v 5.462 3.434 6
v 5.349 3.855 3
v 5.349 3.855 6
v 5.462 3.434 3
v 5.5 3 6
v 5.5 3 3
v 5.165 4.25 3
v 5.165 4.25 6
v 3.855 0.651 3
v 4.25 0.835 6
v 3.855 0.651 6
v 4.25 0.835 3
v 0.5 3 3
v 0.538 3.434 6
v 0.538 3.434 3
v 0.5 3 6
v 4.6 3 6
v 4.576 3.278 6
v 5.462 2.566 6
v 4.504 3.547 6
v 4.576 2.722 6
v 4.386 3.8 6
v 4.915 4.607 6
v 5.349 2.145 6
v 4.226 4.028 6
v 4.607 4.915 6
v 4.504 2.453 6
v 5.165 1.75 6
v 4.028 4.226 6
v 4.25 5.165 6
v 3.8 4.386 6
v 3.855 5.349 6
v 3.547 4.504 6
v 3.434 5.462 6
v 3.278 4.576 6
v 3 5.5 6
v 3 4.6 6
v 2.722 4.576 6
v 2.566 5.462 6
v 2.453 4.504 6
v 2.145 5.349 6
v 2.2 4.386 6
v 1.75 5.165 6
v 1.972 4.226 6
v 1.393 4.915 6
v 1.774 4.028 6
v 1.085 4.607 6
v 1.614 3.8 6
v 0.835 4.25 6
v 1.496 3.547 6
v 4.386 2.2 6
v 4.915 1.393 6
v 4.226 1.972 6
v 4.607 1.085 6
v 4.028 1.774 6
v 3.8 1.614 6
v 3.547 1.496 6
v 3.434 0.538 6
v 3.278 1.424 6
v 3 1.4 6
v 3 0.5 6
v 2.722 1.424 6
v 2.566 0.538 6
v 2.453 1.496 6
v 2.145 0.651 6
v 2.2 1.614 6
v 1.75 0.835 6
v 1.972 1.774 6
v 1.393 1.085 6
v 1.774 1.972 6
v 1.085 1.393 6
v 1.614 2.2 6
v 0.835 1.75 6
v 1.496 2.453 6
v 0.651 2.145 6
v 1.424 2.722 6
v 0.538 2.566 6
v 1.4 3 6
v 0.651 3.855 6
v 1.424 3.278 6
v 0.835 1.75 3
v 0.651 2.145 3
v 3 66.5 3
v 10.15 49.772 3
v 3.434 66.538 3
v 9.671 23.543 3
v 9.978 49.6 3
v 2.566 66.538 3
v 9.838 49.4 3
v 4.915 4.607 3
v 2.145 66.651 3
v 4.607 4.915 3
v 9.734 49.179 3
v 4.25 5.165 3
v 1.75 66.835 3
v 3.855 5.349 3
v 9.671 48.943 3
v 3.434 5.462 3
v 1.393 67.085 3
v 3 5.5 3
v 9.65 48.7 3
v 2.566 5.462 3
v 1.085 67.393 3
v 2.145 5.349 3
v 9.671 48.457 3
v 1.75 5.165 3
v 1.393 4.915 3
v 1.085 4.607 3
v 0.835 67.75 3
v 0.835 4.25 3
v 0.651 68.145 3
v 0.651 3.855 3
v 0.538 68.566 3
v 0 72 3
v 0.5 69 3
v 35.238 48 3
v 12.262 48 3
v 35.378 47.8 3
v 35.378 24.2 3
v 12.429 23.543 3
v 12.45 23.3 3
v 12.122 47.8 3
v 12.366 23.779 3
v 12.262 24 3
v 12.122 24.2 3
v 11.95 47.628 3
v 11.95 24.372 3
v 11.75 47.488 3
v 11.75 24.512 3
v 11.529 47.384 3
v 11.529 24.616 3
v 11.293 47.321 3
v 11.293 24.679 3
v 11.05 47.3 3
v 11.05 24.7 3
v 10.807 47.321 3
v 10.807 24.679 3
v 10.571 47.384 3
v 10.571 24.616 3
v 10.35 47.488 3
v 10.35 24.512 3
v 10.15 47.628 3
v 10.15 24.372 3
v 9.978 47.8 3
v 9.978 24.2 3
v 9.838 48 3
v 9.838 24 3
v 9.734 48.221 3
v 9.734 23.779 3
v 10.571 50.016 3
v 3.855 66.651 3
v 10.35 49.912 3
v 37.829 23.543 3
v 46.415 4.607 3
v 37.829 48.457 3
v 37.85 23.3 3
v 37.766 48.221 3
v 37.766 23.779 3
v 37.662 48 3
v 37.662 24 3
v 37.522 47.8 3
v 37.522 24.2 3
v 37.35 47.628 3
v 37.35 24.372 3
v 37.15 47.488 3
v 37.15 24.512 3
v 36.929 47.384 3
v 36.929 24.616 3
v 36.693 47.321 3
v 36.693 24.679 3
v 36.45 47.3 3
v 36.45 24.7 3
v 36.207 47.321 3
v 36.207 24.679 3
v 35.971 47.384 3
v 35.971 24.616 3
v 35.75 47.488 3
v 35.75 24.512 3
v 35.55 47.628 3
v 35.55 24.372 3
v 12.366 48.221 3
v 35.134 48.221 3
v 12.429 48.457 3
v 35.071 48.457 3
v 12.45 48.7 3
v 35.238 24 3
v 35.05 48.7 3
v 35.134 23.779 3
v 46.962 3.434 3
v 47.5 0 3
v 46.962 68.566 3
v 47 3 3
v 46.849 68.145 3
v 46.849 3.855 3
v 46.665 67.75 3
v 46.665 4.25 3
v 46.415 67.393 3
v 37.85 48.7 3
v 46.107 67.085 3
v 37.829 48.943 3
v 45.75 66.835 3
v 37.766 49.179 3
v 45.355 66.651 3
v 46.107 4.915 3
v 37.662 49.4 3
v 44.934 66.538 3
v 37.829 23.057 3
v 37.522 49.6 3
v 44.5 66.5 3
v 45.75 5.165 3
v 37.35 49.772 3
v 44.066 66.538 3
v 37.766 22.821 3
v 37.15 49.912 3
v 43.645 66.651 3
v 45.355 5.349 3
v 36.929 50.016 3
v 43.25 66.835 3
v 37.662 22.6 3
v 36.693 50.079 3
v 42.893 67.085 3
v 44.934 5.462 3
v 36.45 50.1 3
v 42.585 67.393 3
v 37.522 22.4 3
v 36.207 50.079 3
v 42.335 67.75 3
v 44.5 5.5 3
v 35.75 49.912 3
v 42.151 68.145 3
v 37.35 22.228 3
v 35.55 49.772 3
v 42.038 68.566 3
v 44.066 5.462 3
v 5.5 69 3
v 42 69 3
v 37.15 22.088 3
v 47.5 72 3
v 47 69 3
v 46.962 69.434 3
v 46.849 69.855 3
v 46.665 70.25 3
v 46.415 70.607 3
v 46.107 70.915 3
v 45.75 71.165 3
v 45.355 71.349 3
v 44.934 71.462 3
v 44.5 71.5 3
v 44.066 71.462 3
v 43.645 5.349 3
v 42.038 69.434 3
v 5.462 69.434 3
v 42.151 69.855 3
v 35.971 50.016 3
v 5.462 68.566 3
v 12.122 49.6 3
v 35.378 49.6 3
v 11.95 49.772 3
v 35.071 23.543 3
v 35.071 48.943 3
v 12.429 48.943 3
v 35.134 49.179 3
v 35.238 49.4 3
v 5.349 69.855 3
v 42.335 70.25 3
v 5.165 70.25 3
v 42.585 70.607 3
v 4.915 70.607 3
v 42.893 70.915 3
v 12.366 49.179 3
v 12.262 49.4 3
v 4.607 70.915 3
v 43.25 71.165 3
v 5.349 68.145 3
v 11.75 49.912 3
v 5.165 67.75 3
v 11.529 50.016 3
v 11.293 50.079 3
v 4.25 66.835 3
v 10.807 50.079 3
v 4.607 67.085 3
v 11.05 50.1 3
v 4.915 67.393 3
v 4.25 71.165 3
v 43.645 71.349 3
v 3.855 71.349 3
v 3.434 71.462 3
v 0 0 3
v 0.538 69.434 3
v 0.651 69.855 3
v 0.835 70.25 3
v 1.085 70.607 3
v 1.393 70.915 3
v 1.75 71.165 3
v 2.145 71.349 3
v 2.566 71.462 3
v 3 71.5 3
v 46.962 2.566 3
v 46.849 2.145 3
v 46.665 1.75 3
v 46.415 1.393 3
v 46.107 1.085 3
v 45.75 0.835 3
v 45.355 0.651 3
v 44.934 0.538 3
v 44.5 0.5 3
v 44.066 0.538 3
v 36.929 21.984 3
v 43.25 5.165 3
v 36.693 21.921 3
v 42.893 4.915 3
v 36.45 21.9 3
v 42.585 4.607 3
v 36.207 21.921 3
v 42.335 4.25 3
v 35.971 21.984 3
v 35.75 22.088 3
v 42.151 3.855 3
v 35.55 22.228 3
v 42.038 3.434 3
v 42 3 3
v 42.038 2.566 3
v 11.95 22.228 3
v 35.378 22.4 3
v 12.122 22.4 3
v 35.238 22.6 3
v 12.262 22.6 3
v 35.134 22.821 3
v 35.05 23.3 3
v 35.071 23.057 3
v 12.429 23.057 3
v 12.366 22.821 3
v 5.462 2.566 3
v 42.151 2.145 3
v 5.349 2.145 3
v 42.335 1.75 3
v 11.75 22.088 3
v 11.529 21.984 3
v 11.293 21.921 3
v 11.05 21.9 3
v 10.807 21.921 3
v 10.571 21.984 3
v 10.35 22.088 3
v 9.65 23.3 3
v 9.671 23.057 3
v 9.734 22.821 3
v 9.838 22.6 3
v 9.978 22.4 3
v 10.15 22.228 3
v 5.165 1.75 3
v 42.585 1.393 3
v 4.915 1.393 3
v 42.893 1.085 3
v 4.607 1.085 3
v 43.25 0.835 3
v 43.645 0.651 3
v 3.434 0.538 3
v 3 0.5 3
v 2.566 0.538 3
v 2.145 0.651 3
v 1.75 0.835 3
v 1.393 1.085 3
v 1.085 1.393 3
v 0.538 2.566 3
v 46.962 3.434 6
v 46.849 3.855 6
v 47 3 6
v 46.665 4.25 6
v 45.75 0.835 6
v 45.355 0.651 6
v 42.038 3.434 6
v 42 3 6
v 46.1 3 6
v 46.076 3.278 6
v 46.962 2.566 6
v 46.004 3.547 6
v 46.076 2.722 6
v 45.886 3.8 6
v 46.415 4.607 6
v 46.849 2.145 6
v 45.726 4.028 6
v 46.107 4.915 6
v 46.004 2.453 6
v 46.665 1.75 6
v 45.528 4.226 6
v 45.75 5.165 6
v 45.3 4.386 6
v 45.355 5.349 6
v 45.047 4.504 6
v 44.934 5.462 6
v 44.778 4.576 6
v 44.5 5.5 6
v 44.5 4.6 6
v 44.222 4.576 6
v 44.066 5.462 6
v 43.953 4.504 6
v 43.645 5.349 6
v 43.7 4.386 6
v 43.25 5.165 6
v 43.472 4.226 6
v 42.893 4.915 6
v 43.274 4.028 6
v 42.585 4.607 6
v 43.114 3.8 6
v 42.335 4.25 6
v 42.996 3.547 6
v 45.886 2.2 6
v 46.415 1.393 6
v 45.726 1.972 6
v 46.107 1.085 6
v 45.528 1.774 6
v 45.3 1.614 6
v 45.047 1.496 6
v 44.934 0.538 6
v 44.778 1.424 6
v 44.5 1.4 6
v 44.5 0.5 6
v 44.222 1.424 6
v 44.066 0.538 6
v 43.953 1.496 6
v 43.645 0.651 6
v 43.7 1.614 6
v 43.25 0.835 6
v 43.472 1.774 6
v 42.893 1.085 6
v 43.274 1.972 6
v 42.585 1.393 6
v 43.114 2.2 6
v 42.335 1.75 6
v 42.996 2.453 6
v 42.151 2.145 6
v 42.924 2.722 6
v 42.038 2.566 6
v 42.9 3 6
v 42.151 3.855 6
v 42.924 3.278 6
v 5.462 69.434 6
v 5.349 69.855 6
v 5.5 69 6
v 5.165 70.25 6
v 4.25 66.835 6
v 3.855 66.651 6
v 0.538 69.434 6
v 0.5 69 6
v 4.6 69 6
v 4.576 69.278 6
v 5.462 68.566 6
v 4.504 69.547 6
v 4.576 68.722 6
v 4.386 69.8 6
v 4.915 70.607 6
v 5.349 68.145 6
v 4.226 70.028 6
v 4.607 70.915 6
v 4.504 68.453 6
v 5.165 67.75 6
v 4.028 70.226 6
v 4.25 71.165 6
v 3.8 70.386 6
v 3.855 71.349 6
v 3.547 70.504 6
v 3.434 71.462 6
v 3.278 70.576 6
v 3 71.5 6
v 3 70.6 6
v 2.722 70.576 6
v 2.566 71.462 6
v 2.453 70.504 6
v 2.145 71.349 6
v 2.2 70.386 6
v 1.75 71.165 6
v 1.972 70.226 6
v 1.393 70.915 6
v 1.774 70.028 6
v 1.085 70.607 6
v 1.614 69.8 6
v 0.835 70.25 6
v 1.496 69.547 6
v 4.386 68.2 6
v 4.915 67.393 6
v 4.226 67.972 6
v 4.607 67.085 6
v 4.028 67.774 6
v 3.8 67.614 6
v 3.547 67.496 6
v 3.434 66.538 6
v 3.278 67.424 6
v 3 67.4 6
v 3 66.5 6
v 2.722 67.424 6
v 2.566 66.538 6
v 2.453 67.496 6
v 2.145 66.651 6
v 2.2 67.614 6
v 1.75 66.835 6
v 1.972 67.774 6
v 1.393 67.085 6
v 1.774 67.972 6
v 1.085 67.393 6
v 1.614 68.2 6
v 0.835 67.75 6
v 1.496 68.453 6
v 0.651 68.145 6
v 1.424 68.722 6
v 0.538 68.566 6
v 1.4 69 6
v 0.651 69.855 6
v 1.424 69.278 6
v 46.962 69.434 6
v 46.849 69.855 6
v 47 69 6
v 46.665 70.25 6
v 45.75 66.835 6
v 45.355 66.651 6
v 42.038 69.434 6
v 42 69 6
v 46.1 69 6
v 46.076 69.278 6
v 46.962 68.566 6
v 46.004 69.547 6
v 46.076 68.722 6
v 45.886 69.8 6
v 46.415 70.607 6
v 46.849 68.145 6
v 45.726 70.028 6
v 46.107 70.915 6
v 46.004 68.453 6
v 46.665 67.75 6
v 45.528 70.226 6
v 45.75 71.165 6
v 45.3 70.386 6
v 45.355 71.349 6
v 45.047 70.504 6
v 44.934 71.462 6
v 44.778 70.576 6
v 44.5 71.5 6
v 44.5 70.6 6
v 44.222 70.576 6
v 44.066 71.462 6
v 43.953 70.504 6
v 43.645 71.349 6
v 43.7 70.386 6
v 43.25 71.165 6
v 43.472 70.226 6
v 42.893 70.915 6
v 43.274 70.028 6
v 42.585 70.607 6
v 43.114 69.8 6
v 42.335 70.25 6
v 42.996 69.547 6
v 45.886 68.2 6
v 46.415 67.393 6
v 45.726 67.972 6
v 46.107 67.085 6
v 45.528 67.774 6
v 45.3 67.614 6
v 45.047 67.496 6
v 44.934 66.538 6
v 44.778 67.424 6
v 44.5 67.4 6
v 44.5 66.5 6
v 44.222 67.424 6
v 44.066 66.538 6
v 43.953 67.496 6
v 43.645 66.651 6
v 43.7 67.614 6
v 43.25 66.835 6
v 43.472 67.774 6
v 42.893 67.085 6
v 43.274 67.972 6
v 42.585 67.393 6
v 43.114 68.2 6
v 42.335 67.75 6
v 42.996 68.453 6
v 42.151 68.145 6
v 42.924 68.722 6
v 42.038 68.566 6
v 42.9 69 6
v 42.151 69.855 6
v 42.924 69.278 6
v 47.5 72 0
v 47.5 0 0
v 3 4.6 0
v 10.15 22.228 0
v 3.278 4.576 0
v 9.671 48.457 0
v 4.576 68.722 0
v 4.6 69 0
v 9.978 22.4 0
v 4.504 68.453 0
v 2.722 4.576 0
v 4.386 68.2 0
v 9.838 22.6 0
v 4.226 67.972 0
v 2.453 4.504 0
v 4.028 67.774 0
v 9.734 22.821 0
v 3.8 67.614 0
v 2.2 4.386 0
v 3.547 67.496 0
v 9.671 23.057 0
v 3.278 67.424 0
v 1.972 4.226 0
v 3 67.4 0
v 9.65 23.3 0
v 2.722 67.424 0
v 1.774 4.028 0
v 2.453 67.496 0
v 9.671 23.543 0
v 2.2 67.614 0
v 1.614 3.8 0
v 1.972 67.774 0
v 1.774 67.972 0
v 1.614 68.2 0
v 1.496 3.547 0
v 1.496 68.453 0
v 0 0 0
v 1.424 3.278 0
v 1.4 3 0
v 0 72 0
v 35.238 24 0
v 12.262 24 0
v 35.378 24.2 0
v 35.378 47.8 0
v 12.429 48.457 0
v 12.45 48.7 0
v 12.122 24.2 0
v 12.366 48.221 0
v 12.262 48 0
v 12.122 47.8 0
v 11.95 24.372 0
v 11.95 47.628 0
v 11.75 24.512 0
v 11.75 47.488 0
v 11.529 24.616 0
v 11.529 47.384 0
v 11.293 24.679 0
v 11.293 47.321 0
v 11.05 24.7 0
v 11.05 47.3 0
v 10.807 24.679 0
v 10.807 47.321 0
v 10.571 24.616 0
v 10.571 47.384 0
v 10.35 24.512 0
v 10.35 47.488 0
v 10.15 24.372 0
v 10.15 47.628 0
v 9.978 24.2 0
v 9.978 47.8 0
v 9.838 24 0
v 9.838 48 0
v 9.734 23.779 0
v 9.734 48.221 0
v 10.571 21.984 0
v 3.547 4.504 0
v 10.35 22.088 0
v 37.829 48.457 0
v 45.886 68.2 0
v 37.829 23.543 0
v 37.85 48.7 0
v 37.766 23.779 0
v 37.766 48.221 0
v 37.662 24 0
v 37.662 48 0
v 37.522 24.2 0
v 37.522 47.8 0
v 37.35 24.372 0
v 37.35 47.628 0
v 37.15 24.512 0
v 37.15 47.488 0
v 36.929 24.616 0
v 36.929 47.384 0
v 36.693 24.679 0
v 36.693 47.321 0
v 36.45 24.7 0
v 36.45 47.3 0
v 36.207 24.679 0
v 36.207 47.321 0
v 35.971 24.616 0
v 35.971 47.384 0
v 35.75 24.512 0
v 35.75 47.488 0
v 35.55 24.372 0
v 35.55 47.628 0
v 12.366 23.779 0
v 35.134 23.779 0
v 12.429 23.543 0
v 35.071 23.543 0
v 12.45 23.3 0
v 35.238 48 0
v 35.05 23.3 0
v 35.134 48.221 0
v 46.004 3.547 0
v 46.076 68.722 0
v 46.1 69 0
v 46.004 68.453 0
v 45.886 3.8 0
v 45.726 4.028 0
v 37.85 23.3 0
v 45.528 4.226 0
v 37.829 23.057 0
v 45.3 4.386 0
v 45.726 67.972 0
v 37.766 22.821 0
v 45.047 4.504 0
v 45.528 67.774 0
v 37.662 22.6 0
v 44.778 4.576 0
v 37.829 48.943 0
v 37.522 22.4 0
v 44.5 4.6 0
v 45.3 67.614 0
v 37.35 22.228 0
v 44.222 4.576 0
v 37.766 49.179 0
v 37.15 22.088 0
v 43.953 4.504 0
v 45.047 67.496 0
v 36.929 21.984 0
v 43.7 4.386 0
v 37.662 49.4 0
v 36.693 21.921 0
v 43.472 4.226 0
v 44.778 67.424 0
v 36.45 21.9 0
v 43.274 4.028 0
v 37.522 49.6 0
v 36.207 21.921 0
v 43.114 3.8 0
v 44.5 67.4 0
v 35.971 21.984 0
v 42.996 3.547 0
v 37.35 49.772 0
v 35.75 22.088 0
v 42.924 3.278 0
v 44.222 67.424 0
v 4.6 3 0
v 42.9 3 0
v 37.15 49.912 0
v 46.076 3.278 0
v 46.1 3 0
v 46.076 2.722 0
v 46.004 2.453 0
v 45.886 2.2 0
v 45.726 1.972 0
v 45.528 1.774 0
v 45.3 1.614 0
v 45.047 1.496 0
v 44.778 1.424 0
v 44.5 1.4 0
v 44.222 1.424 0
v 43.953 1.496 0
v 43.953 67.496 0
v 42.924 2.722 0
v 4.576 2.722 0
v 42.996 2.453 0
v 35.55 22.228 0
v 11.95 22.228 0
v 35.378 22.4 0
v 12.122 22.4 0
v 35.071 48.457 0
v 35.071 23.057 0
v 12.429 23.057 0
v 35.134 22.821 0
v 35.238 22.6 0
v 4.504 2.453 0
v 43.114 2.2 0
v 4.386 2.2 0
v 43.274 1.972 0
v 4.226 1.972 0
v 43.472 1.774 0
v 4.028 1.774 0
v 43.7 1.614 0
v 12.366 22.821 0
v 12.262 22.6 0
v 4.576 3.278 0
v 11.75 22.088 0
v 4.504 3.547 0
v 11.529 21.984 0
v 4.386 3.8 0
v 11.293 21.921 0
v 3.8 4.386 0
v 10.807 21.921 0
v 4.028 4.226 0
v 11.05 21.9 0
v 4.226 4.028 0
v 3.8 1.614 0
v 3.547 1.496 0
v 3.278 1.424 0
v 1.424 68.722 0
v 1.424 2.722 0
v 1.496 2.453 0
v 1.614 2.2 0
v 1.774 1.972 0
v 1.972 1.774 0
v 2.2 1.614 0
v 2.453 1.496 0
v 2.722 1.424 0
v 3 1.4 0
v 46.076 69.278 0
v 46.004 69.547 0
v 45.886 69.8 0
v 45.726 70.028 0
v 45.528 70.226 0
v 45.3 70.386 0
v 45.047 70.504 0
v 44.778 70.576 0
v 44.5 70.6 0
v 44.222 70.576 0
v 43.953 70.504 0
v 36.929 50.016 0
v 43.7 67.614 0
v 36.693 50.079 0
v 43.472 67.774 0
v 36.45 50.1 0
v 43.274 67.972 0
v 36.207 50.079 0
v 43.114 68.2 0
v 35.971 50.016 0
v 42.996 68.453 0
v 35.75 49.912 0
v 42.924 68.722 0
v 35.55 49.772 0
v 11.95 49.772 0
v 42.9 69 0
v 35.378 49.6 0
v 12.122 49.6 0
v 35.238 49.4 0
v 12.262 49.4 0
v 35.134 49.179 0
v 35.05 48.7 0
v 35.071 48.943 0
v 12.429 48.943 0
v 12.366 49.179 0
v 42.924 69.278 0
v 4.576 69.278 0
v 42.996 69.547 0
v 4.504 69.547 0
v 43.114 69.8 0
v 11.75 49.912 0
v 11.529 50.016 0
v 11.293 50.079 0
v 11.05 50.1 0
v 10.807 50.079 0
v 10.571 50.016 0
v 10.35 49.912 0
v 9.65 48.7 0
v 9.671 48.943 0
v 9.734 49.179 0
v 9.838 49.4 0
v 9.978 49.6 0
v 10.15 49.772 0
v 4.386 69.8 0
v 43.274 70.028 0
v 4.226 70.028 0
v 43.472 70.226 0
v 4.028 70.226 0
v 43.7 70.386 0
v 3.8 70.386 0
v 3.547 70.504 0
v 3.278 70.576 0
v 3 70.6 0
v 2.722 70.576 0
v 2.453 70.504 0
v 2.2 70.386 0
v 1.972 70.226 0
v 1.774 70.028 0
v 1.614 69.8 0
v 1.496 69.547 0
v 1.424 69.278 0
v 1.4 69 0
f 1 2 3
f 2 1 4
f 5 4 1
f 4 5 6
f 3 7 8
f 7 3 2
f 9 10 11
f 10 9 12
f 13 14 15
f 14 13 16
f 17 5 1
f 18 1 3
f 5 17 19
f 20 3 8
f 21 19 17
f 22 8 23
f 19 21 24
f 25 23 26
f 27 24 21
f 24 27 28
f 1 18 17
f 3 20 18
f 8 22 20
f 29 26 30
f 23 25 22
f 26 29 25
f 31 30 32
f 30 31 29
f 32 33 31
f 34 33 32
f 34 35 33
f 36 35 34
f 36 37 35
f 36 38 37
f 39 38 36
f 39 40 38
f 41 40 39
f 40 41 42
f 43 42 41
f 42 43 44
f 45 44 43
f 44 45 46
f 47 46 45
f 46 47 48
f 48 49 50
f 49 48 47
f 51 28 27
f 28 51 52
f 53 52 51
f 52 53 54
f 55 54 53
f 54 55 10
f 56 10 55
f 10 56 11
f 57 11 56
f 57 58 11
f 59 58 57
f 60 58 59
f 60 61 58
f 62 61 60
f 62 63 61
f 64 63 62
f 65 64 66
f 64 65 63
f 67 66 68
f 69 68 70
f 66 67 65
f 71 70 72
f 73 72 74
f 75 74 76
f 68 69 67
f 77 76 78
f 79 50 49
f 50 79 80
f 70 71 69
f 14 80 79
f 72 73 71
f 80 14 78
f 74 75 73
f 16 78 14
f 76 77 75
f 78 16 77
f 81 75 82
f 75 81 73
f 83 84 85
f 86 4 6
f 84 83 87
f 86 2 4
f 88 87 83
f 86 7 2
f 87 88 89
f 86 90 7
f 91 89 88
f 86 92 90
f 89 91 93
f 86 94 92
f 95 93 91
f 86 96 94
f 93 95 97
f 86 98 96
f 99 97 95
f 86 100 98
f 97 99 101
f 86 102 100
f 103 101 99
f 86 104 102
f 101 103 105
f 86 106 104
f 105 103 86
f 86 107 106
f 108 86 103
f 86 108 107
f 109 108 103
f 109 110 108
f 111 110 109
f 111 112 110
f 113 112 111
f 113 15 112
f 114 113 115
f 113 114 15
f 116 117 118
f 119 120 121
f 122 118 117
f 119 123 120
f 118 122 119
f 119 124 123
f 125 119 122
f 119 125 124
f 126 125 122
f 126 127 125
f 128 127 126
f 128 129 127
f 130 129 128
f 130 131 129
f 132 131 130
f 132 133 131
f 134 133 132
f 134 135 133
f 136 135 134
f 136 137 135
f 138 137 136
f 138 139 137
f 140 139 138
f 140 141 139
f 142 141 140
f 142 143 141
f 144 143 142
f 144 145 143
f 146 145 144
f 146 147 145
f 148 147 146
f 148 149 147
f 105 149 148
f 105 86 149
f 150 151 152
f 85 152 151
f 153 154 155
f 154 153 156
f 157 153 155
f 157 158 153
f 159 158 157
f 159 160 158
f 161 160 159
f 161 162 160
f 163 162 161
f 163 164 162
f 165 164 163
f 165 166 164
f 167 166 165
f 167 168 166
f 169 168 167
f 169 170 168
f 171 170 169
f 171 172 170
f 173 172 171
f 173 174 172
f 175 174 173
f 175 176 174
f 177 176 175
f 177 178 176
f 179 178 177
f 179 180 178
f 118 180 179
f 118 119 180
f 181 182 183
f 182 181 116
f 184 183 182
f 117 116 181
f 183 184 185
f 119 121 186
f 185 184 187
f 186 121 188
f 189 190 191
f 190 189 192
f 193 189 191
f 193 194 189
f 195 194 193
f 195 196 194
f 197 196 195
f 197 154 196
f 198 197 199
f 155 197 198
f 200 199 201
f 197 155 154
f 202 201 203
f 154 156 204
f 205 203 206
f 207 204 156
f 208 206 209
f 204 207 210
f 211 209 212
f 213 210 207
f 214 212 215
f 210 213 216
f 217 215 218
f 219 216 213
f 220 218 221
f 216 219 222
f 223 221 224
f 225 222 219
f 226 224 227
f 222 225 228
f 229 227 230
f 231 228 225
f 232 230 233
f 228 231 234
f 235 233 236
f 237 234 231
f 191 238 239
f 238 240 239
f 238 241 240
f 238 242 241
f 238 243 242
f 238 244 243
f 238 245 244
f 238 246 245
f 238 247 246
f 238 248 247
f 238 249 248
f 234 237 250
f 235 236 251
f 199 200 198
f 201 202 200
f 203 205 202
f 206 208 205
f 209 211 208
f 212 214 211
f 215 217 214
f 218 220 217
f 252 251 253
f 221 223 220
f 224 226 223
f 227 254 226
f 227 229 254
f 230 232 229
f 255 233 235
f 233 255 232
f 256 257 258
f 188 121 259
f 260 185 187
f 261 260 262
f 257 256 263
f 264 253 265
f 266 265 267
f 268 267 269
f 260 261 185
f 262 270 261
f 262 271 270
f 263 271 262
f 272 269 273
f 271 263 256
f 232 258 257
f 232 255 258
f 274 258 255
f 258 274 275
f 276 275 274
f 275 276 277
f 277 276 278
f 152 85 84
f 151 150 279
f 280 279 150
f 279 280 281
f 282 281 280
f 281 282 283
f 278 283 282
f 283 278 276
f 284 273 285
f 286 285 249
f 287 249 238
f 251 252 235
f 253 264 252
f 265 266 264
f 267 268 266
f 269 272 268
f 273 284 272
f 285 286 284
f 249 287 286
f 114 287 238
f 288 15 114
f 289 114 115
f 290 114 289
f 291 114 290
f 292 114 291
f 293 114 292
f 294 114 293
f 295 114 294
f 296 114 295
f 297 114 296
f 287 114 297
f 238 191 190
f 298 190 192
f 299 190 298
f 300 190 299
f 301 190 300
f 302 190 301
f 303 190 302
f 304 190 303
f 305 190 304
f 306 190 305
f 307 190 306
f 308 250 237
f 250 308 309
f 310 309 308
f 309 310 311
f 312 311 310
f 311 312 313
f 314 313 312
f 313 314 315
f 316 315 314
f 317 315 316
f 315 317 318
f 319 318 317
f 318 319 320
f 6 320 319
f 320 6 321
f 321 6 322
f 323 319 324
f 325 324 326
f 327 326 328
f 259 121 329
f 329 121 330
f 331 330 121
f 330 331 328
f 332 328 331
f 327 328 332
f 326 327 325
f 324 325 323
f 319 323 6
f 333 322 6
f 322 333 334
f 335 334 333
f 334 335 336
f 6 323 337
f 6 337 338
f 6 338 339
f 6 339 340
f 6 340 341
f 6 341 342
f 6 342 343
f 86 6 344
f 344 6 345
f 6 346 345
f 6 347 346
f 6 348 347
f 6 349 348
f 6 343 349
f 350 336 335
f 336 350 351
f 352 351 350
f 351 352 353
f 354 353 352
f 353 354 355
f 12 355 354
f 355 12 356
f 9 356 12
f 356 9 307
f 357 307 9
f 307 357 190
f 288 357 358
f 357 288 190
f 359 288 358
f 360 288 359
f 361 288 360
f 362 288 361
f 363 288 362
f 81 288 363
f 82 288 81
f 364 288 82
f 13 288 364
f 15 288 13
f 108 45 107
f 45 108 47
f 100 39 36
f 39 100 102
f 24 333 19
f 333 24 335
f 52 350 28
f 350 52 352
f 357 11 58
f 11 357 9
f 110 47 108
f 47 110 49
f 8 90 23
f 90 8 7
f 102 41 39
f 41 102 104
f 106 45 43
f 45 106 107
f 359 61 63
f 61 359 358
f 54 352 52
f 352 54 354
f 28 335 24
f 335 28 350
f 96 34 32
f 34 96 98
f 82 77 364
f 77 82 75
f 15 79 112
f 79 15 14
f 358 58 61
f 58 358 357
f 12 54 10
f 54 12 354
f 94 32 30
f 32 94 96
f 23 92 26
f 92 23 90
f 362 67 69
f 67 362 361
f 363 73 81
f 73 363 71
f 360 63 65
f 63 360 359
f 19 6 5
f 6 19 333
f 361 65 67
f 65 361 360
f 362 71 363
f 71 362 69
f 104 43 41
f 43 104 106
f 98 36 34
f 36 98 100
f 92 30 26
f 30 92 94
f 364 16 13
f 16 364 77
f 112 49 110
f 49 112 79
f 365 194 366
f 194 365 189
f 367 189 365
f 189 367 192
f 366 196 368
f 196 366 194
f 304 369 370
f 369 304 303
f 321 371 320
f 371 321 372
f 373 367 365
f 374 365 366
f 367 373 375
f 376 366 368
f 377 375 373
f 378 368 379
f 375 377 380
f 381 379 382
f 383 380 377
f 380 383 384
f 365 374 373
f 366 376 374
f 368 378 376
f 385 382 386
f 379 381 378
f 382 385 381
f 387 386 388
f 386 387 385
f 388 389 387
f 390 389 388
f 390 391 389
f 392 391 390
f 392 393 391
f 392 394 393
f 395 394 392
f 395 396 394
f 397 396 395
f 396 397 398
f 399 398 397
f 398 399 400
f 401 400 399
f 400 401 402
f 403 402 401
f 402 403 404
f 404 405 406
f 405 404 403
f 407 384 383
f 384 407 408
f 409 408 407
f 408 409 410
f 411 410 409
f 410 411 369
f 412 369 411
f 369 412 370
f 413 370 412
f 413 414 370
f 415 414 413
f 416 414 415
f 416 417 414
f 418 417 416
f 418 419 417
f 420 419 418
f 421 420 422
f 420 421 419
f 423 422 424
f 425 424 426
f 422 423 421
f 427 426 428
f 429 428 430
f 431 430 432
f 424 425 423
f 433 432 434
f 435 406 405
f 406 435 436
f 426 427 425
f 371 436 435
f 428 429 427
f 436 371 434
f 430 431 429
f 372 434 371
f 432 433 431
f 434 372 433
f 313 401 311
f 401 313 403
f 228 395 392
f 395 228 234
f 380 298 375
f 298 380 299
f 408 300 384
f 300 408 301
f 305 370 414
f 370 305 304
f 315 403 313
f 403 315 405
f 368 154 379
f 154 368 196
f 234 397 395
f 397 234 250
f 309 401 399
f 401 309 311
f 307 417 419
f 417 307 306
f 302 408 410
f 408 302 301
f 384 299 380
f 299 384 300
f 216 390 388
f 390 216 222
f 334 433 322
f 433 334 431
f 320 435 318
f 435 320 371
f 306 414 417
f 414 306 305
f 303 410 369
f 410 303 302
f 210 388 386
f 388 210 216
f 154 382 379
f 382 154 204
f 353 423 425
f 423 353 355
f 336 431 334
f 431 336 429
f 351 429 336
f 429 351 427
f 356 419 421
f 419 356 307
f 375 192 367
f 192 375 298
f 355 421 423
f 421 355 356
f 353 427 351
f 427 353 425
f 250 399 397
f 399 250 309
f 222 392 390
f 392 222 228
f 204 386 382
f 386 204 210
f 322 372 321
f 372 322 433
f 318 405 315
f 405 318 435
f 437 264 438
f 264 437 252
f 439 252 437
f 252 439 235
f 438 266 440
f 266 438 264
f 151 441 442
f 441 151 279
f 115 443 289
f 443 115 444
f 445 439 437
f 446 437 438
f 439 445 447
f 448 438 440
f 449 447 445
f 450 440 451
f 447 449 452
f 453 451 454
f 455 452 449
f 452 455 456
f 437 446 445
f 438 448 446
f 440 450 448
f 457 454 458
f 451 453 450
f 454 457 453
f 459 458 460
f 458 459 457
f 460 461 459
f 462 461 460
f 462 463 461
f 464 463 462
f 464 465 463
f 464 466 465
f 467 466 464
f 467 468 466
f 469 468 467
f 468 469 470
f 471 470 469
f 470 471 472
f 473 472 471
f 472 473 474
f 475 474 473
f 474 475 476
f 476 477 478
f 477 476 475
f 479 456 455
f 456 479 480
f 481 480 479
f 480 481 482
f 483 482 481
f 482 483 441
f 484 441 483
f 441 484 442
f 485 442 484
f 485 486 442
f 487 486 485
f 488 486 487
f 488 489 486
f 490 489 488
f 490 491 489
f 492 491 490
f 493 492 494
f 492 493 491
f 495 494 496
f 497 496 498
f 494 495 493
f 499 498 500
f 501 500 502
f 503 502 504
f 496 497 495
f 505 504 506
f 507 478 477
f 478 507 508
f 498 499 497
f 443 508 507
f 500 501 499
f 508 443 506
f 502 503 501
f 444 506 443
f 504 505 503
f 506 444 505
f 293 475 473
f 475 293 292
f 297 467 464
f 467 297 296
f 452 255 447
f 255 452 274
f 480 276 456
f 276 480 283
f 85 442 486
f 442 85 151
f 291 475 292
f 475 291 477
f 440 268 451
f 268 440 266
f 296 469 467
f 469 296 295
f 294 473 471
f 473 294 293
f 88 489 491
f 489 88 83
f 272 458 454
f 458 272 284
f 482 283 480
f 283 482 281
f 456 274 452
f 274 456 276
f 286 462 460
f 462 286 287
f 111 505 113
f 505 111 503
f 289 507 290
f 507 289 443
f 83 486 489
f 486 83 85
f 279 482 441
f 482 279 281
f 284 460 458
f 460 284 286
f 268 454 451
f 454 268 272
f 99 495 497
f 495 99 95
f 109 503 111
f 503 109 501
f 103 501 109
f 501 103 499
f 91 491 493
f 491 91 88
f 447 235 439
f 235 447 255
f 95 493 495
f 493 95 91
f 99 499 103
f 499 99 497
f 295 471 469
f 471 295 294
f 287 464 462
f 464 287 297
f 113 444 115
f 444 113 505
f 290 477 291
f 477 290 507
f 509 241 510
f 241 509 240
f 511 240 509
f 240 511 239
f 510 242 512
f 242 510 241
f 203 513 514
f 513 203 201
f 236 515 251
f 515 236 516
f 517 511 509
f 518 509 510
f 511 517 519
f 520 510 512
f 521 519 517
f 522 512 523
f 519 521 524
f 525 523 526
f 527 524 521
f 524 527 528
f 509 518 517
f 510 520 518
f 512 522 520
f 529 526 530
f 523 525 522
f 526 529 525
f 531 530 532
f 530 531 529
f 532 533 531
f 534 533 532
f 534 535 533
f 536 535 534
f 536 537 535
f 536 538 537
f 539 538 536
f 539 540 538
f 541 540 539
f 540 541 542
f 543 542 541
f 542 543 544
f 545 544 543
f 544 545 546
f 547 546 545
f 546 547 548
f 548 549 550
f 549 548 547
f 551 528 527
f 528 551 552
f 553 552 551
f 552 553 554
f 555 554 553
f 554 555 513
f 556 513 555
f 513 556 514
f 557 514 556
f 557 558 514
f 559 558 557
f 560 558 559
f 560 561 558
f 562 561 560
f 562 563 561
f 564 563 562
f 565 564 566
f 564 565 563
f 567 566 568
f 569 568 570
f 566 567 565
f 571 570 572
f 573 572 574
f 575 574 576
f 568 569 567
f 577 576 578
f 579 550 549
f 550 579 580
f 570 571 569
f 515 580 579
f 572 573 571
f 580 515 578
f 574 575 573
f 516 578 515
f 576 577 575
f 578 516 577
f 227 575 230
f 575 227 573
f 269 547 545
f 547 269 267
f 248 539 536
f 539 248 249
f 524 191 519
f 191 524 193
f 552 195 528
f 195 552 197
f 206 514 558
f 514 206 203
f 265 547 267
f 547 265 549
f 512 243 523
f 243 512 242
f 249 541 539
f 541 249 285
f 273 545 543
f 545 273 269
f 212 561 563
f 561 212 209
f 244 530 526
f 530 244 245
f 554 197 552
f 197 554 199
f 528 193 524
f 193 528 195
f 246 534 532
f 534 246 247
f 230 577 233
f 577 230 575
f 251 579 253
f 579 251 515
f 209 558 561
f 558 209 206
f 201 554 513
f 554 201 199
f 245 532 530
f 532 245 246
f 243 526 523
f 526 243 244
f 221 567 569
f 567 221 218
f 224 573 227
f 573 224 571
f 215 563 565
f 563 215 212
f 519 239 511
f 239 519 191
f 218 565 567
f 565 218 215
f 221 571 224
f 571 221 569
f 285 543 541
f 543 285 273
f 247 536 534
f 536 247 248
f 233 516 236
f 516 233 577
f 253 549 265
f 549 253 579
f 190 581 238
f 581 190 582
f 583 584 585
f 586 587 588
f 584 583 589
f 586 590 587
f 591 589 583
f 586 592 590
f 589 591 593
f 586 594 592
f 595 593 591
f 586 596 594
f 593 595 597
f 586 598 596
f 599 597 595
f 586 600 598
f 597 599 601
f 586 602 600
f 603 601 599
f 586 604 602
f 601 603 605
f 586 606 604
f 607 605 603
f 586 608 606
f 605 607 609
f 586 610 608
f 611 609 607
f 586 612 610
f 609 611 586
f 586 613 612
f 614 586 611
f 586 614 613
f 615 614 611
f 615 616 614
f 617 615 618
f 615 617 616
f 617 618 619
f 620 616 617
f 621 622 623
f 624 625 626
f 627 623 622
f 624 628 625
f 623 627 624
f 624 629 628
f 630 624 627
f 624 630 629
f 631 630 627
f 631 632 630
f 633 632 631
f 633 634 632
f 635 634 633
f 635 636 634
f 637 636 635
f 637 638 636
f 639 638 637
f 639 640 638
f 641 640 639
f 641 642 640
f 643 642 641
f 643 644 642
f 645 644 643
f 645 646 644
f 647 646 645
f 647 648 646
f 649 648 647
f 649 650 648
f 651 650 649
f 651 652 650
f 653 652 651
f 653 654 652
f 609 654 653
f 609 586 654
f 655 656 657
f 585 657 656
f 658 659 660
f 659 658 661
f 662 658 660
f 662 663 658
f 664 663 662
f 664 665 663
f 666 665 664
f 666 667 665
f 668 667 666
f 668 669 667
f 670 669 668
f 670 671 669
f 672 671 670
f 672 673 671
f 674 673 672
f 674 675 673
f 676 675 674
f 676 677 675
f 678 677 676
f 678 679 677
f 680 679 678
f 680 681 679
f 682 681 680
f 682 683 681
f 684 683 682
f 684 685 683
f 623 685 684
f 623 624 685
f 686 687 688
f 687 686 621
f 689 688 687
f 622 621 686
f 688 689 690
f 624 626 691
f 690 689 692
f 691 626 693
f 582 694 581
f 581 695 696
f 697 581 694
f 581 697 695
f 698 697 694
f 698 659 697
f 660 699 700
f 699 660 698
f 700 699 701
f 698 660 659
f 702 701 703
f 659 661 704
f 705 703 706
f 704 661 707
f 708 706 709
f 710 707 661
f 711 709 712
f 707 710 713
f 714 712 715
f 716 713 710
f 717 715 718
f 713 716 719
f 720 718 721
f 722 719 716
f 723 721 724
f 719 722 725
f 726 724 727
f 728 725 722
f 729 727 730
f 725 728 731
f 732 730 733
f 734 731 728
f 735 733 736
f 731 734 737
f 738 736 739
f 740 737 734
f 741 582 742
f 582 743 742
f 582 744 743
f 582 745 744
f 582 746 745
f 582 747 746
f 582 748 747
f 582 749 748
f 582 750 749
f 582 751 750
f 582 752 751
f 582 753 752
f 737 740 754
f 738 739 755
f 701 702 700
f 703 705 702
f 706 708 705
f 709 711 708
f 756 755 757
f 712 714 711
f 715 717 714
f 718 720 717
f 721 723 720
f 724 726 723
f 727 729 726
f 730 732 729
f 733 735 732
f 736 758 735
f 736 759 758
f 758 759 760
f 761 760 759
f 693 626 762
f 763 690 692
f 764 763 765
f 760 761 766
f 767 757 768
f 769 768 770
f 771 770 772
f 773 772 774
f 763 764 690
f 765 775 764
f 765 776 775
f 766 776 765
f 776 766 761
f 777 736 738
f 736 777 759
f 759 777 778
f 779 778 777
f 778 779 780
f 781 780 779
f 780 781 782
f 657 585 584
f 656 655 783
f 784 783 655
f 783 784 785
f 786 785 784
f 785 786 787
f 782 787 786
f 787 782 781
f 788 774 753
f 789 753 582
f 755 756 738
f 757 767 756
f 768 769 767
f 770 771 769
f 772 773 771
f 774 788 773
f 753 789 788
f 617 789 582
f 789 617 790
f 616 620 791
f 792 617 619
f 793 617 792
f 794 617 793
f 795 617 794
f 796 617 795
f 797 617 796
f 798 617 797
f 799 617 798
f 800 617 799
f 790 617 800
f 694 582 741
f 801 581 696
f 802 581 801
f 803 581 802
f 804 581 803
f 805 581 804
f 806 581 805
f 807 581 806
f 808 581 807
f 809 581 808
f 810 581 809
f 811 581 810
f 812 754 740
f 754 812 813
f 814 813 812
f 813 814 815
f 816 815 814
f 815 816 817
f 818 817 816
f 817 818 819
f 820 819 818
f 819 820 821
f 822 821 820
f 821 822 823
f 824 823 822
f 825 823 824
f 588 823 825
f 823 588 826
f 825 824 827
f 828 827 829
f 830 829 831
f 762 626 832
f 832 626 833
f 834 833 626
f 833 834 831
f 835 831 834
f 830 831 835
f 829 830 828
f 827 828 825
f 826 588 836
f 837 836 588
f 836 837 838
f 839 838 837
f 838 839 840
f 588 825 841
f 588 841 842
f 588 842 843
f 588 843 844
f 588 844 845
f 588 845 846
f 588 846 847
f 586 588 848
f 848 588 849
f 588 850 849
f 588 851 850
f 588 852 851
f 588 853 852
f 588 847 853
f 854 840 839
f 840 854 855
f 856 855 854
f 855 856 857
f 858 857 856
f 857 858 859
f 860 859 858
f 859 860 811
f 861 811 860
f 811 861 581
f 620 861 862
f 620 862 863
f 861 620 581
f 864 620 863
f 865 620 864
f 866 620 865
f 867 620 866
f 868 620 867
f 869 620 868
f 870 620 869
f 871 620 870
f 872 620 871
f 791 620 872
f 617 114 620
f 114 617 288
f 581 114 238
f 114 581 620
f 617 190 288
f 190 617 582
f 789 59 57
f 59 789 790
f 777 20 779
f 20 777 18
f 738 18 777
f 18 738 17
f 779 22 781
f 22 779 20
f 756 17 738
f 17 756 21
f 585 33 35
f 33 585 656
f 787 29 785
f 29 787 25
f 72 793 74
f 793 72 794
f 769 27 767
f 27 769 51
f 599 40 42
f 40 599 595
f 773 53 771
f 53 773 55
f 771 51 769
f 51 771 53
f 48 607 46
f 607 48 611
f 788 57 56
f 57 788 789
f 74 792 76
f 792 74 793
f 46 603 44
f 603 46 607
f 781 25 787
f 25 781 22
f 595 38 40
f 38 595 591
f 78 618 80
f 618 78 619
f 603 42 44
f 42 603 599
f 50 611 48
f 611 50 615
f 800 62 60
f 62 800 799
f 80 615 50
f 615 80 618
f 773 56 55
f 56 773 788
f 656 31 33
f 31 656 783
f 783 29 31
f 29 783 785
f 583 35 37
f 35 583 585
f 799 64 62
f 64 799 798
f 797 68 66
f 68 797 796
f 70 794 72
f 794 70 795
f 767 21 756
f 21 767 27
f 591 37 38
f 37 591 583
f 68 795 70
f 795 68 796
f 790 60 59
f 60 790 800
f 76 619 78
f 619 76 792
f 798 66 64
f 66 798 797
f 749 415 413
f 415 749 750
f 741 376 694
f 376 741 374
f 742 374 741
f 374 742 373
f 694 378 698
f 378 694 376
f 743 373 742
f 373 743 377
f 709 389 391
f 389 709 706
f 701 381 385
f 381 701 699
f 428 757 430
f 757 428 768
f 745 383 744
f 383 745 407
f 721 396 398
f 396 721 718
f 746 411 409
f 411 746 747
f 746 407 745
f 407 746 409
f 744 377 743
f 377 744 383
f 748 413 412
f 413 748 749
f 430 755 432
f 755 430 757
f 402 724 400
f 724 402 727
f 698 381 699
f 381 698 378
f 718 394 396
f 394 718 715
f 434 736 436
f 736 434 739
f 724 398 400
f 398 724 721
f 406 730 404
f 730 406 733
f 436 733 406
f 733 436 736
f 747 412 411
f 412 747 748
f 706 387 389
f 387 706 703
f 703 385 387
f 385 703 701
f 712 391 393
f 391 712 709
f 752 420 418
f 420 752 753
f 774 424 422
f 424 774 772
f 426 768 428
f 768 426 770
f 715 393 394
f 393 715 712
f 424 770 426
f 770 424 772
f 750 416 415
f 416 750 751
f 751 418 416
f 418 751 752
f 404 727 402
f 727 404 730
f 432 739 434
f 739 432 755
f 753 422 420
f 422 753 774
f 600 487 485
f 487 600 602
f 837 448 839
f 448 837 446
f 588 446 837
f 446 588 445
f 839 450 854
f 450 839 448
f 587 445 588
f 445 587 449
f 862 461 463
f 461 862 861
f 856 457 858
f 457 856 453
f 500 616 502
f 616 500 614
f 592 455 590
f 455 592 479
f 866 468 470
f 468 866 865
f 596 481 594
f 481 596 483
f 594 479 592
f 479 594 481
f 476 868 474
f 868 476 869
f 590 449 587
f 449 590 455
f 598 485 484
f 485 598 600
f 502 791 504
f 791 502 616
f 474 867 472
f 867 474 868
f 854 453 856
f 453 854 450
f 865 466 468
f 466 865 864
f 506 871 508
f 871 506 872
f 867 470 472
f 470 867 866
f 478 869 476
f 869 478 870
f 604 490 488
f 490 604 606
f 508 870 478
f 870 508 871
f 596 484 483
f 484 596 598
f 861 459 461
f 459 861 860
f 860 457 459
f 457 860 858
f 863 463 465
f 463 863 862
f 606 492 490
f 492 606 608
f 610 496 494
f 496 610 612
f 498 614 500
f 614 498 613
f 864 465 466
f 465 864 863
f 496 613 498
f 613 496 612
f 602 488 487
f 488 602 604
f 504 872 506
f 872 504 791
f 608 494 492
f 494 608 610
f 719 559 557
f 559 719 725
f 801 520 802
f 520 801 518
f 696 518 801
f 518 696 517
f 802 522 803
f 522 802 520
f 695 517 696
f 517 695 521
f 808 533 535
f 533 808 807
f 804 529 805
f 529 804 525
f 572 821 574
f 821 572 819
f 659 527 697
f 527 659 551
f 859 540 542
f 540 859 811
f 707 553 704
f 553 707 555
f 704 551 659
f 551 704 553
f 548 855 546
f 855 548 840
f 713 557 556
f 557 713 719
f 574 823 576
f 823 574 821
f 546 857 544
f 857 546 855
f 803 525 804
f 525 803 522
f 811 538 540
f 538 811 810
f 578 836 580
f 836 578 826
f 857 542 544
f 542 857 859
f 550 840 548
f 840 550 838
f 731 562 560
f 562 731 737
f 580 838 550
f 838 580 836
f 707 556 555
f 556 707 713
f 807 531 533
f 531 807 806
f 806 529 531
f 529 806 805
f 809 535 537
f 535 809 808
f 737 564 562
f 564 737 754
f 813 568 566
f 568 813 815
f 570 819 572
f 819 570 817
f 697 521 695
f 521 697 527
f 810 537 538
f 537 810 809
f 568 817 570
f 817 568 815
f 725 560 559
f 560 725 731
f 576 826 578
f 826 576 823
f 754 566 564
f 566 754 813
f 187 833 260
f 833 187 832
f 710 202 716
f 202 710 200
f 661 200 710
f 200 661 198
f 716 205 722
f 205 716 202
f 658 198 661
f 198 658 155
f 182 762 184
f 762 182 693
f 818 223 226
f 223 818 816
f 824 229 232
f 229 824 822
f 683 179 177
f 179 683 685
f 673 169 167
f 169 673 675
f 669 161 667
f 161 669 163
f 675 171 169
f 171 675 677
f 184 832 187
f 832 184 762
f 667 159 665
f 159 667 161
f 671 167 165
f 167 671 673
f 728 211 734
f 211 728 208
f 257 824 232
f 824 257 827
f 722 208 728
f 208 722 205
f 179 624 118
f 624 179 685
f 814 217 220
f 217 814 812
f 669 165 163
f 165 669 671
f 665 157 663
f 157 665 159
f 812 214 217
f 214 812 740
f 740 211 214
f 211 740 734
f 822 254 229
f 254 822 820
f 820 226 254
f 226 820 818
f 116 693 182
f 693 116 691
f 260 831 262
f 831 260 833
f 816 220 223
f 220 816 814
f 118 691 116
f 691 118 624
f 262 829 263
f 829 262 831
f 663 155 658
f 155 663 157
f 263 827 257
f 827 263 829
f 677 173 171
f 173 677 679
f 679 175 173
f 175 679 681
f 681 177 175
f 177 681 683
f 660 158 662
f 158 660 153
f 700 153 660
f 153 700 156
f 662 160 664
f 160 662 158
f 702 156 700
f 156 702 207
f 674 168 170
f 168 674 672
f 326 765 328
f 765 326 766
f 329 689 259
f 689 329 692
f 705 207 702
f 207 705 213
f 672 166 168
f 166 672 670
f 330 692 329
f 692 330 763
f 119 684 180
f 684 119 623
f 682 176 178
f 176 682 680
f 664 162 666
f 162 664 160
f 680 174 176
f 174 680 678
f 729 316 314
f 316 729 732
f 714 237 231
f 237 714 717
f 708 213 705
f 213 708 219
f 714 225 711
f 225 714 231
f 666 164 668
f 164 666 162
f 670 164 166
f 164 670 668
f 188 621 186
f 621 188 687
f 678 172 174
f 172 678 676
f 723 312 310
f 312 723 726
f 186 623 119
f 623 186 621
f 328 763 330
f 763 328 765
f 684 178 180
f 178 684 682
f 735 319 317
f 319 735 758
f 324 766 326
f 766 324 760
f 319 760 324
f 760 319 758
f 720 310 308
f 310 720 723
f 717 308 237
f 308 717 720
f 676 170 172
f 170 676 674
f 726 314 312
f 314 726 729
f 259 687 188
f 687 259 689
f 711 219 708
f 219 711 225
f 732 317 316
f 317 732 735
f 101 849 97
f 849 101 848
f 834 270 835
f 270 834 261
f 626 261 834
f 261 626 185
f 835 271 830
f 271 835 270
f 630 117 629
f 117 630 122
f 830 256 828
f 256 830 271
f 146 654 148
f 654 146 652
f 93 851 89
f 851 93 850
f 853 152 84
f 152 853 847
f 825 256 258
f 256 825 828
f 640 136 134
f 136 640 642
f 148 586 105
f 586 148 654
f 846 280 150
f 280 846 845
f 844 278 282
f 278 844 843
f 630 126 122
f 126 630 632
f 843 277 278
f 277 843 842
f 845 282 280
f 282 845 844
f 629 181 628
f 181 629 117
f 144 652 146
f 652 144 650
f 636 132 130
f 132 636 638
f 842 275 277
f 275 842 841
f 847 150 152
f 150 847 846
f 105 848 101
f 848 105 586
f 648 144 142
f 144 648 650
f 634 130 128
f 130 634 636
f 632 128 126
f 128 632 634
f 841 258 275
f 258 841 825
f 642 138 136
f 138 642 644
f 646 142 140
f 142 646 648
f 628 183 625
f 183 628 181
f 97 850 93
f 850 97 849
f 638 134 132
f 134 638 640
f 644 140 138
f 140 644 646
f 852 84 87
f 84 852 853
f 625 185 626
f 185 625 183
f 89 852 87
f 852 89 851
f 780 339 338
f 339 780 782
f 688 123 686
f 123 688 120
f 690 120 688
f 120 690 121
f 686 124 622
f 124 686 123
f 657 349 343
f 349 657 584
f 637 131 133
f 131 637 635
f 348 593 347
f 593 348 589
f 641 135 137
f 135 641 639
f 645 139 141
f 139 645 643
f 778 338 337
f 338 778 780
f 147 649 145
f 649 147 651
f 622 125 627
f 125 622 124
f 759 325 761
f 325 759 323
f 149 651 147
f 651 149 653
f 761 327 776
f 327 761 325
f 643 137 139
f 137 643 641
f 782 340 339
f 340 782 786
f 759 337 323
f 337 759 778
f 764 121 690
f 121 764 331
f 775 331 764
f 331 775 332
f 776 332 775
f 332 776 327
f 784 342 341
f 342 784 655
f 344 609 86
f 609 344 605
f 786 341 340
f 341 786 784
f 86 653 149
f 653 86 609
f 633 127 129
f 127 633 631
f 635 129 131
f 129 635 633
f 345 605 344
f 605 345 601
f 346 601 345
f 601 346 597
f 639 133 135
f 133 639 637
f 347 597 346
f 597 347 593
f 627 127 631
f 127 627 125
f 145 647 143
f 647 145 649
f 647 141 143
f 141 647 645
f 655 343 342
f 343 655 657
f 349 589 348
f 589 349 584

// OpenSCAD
//
// 秋月電子の C基板と同形状の板
//
// AkizukiPCB_TypeC-3-20250515B.scad
//
// https://akizukidenshi.com/goodsaffix/p3231_ryoumen_c.pdf （C基板）
// https://akizukidenshi.com/goodsaffix/LPMxxxT2-C_rev1.pdf （C基板用アクリルパネル）
//
// Prev update: 2025-05-16(Fri) 06:03 JST / 2025-05-15(Thu) 21:03 UTC
// Prev update: 2025-05-22(Thu) 23:25 JST / 2025-05-22(Thu) 14:25 UTC
// Prev update: 2025-05-25(Sun) 08:08 JST / 2025-05-24(Sat) 23:08 UTC
// Last update: 2025-05-26(Mon) 11:50 JST / 2025-05-26(Mon) 02:50 UTC
//

Px = 47.5; Py = 72.0; Pz = 3.0;     // 通常の「C基板」に合わせる場合の 横・縦・厚さ （P は "Panel" の P）
// Px = 51.0; Py = 76.0; Pz = 3.0;  // 「C基板用アクリルパネル』にあわせる場合
Cd = 5.0;  Cz = 3.0;                // 円柱の直径、位置、厚さ （Cは "Cylinder" の C）
H1d = 3.2; H1p = 3.0; // H1p = 5.0; // 穴1の直径、位置（オフセット） （H は "Hole" の H）
H2d = 2.8;                          // 穴2の直径

// ネジ穴1の位置リスト
hole1_pos = [
  [ H1p,       H1p      ],
  [ Px - H1p,  H1p      ],
  [ H1p,       Py - H1p ],
  [ Px - H1p,  Py - H1p ]
];

// ネジ穴2の位置リスト
hole2_pos = [
  [ Px/2 + 12.7, Py/2 + 12.7 ],
  [ Px/2 + 12.7, Py/2 - 12.7 ],
  [ Px/2 - 12.7, Py/2 + 12.7 ],
  [ Px/2 - 12.7, Py/2 - 12.7 ],
];

difference() {
    // (1) まず、4本の円柱を持つ直方体のパネルを作る
    union() {
        // パネルを用意
        cube([Px, Py, Pz]);  // 第1章限で造形する場合
        // translate([0, Py, 0]) cube([Px, -Py, Pz]); // 第4象限で造形する場合
        // 円柱を4本立てる
        for (pos = hole1_pos) {
            x = pos[0]; y = pos[1];
            translate([x, y, Pz]) cylinder(h = Cz, d = Cd, $fn = 36);
        }
    }
    // (2) 次に、それぞれの円柱に穴1を貫通させる
    for (pos = hole1_pos) {
        x = pos[0]; y = pos[1];
        translate([x, y, -1.0]) cylinder(h = Pz + Cz + 2.0, d = H1d, $fn = 36);
        // 確実に穴をあけるため、パネル厚+円柱厚より2mm長い円柱をパネル底面より1mm沈めて配置
    }
    // (3) 最後に、パネルに穴2を貫通させる
    for (pos = hole2_pos) {
        x = pos[0]; y = pos[1];
        translate([x, y, -1.0]) cylinder(h = Pz + 2.0, d = H2d, $fn = 36);
        // 確実に穴をあけるため、パネル厚+円柱厚より2mm長い円柱をパネル底面より1mm沈めて配置
    }
}
